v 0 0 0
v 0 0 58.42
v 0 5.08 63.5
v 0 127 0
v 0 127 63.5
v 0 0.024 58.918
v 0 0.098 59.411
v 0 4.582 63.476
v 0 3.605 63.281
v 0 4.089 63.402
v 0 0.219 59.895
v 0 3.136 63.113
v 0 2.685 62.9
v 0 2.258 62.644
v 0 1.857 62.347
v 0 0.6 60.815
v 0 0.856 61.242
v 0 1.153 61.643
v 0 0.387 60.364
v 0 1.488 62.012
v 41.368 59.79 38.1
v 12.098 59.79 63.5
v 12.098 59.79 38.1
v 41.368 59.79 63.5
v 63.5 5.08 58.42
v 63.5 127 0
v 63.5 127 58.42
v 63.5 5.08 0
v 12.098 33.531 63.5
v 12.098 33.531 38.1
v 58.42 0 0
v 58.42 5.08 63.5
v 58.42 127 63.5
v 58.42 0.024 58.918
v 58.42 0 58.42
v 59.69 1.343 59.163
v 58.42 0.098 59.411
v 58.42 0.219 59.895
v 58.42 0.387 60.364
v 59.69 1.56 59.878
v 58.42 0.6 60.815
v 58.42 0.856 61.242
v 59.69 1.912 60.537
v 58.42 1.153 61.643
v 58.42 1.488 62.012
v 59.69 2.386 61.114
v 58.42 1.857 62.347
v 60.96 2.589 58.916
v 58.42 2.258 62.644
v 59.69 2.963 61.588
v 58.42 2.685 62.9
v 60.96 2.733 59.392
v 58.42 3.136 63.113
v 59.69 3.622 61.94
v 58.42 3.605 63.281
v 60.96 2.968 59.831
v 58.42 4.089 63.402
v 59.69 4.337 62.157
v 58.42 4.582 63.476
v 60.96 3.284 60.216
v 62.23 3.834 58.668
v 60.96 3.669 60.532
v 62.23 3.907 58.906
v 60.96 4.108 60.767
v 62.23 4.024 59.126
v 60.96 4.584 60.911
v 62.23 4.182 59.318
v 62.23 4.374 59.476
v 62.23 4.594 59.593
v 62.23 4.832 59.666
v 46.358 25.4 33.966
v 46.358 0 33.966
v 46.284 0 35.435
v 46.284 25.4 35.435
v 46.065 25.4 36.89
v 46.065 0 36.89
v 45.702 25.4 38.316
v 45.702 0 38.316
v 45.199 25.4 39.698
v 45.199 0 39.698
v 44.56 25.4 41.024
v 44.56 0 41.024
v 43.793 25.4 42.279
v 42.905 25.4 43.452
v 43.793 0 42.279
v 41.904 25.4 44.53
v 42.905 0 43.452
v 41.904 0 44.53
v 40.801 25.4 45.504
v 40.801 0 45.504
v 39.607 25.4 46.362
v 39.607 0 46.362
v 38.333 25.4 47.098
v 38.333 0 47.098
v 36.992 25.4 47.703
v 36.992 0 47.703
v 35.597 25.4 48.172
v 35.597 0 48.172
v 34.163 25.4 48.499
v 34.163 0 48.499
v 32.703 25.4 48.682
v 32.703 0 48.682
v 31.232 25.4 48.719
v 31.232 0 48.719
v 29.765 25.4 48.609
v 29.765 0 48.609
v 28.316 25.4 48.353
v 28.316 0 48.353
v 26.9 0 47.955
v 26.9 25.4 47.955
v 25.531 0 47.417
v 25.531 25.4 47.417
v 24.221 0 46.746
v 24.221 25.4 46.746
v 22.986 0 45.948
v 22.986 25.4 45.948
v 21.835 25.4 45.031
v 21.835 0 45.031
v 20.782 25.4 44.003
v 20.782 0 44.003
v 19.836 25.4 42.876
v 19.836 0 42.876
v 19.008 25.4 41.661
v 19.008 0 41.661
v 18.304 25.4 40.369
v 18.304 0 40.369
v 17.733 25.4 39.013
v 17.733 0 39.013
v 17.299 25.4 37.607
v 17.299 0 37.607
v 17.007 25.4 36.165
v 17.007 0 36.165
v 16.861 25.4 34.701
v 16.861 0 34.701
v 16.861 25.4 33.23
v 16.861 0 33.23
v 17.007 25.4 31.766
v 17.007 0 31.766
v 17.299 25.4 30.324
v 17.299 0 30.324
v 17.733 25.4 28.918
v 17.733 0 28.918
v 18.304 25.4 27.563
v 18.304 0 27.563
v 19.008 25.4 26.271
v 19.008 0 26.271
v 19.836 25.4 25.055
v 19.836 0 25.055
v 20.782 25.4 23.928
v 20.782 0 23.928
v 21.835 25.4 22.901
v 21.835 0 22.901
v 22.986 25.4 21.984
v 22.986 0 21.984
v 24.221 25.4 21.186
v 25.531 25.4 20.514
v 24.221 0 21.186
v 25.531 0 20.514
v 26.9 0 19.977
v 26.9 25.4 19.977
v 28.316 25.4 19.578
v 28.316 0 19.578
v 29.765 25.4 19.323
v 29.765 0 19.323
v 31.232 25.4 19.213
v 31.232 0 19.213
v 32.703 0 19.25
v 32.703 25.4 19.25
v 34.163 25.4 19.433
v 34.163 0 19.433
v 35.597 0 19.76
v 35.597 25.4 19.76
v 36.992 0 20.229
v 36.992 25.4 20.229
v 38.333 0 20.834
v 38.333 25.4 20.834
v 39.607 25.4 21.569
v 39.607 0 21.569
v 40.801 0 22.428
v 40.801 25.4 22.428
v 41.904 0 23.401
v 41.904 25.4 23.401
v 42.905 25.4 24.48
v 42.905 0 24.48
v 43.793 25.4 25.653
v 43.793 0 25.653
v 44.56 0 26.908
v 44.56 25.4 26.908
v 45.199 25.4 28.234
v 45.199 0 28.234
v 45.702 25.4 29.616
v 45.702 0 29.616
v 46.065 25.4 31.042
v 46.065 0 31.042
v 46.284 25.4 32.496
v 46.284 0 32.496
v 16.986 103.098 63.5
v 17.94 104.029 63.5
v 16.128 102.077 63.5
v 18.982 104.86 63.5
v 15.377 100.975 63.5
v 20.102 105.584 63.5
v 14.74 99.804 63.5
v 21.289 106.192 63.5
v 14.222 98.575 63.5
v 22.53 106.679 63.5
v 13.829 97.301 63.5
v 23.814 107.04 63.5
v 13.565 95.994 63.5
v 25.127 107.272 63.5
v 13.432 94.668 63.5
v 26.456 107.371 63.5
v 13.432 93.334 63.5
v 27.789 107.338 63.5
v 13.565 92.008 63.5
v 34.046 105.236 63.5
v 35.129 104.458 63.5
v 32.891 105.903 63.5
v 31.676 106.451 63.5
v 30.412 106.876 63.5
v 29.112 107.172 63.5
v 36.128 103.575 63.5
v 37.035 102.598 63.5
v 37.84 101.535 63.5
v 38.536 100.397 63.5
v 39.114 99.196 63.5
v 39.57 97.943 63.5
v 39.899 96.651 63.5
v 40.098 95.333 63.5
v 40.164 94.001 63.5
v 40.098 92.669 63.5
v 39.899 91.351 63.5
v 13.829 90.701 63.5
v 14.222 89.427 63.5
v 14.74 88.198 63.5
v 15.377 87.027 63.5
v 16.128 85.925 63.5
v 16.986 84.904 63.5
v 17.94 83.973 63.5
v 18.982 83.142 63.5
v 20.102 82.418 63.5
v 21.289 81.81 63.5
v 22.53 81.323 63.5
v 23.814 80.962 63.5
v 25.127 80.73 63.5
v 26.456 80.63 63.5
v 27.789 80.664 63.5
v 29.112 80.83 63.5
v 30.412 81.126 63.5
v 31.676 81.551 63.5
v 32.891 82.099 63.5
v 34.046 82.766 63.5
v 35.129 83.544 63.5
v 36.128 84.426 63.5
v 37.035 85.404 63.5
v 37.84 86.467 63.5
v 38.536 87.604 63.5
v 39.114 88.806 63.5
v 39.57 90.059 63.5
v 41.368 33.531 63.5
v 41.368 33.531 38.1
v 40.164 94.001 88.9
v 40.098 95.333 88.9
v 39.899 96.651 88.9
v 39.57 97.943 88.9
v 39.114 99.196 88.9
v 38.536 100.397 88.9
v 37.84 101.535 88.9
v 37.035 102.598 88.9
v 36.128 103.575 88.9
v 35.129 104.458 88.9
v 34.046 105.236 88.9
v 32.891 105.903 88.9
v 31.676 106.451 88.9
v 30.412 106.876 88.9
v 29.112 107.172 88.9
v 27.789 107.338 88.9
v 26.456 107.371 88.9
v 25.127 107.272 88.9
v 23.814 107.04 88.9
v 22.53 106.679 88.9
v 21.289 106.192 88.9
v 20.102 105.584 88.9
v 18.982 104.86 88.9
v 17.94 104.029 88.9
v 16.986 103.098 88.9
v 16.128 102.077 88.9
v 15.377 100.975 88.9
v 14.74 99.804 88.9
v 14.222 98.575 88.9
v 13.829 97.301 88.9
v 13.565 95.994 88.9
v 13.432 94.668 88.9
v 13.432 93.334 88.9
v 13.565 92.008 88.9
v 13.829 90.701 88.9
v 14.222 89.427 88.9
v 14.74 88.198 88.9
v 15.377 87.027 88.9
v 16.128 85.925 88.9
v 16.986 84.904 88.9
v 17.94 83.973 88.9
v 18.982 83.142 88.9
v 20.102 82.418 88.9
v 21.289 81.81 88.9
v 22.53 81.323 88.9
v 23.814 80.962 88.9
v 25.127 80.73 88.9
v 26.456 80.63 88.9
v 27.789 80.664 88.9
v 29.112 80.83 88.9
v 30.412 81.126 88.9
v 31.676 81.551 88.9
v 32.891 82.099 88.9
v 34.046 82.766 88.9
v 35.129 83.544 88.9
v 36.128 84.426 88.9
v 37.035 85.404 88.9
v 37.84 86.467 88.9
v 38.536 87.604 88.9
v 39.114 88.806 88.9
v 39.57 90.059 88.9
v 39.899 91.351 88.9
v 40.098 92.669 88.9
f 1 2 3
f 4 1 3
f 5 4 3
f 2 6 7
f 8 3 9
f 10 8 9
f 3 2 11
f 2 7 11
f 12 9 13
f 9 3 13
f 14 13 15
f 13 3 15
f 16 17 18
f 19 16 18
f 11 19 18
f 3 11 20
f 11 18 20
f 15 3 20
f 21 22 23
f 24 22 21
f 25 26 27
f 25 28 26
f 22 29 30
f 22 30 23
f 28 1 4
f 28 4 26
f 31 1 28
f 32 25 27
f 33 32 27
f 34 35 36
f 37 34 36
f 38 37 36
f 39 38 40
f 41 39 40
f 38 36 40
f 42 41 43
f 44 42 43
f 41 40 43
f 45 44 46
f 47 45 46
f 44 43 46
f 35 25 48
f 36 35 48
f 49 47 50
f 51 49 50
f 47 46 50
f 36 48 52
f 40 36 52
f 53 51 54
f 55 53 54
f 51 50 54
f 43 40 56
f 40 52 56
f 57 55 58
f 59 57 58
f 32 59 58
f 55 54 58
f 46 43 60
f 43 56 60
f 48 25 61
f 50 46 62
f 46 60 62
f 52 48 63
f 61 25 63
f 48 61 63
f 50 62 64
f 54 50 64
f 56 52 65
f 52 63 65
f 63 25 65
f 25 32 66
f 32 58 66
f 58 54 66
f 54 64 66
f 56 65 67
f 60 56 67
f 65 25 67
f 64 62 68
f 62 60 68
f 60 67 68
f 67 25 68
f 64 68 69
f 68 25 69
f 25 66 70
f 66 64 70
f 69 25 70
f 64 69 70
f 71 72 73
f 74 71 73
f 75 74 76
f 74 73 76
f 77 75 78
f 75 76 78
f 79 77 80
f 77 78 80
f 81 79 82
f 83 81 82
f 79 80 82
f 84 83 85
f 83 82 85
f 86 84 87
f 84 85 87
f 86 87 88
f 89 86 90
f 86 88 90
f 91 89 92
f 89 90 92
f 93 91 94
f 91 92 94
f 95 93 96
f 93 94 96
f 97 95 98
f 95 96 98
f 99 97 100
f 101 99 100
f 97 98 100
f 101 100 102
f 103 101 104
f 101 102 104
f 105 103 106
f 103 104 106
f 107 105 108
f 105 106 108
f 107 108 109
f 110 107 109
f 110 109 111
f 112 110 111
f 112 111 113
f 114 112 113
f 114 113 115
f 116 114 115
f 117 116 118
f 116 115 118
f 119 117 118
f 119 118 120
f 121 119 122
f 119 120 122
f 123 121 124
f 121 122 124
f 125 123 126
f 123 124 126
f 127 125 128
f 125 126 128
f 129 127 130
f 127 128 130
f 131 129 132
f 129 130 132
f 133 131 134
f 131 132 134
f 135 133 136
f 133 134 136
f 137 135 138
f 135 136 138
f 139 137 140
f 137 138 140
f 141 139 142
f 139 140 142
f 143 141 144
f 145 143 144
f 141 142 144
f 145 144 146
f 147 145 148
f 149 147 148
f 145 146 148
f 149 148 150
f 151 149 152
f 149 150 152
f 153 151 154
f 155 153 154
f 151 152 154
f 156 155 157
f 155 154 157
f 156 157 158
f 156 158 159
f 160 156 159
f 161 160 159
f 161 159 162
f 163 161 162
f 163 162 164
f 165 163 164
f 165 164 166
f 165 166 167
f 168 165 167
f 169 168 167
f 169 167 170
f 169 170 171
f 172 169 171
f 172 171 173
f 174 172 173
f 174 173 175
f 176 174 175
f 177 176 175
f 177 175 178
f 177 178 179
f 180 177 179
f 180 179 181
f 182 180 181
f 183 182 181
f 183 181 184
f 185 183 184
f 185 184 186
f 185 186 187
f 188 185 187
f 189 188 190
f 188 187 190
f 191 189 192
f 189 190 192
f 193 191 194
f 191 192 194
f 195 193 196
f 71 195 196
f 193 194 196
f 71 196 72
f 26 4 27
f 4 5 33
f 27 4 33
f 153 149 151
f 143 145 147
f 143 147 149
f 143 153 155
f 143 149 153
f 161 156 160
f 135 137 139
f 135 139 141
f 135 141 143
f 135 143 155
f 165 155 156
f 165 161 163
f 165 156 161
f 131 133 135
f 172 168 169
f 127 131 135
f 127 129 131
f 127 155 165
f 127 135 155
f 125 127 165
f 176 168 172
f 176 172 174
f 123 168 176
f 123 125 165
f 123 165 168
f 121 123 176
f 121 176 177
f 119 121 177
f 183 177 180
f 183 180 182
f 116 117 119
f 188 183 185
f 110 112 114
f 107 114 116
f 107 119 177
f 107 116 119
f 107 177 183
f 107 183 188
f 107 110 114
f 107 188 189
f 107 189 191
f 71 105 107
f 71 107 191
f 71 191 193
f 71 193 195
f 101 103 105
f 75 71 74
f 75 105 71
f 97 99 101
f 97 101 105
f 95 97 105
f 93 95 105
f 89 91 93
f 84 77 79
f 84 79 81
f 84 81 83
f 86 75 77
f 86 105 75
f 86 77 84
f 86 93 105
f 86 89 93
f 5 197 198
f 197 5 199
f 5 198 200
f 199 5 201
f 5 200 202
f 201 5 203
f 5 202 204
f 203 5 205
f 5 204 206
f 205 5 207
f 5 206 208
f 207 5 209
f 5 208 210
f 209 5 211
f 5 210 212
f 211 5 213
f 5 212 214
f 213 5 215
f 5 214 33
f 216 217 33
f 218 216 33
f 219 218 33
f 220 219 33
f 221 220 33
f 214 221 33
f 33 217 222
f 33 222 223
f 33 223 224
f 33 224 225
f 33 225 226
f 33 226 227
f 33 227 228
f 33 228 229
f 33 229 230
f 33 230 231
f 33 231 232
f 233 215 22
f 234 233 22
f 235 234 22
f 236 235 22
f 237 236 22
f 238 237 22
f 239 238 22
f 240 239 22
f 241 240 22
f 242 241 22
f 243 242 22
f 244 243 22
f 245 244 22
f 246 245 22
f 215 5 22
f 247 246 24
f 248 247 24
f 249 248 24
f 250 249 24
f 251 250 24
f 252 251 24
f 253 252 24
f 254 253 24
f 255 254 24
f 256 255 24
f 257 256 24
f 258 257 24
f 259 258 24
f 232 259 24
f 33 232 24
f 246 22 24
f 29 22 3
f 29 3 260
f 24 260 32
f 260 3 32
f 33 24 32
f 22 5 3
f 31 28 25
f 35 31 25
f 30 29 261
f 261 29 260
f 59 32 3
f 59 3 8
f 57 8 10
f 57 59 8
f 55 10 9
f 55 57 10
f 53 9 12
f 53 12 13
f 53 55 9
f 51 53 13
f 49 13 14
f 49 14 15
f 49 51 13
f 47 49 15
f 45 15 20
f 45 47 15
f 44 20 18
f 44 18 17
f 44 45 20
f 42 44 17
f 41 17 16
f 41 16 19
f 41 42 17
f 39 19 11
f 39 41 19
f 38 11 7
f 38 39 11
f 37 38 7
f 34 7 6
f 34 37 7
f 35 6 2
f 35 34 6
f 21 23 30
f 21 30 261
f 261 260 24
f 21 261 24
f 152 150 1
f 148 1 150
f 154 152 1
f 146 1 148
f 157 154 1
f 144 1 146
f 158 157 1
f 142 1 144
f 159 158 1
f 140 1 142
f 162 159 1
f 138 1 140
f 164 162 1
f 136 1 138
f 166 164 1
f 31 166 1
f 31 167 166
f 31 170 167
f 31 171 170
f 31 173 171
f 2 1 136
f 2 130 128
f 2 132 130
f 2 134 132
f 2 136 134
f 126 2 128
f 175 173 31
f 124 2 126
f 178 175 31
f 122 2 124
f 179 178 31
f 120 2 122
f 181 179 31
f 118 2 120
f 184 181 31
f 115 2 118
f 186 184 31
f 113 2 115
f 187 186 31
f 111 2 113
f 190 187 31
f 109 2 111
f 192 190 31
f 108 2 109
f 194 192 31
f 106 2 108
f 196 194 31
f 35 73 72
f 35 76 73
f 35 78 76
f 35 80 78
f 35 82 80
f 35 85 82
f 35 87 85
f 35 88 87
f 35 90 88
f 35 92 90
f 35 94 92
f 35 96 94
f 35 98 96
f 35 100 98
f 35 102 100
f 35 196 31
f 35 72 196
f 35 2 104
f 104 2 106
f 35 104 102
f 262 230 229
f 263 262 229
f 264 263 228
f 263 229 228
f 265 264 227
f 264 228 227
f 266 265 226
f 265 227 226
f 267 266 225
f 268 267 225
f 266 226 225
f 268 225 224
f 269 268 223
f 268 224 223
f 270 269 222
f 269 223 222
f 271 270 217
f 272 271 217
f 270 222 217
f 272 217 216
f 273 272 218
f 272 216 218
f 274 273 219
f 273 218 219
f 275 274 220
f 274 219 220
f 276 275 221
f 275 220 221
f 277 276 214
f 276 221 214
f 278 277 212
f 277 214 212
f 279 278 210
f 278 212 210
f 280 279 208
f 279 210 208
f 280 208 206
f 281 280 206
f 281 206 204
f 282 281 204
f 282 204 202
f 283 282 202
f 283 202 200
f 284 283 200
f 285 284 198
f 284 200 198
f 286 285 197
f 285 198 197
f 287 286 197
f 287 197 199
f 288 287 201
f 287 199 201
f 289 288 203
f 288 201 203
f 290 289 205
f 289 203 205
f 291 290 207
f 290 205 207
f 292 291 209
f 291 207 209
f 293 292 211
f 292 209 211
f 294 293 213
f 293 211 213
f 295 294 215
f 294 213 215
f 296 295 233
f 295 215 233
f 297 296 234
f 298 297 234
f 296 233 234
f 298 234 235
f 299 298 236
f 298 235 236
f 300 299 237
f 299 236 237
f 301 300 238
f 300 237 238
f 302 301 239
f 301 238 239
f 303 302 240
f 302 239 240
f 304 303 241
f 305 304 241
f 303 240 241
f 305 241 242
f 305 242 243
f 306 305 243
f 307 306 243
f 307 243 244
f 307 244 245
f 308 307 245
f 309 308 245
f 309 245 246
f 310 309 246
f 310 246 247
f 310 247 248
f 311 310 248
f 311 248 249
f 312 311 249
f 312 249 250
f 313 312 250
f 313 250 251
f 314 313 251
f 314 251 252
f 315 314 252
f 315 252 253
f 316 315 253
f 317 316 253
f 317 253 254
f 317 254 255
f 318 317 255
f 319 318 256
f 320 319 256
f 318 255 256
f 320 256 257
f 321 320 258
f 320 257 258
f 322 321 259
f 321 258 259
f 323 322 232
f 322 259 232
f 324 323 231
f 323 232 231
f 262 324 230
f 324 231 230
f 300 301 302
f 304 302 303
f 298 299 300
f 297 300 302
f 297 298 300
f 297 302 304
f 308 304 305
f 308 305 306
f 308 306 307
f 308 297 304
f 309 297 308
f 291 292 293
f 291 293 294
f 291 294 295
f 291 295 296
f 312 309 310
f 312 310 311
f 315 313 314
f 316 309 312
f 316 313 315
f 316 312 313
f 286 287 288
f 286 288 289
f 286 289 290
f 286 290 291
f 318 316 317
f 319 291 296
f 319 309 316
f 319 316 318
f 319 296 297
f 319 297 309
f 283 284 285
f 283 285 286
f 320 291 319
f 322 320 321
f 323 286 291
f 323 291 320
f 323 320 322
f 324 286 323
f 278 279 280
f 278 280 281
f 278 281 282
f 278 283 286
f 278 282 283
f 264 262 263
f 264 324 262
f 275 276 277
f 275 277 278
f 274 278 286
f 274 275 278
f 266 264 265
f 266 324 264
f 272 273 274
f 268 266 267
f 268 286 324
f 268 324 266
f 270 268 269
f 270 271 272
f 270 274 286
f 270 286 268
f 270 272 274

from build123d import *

# Parameters (mm, degrees)
F0_W     = 63.5
F0_H     = 63.5
F1_DEPTH = 127
F2_R     = 5.08
F3_SIZE  = 5.08
F4_W     = 29.269816
F4_H     = 26.25883
F5_DEPTH = 25.4
F4_R     = 13.374611
F6_DEPTH = 25.4
F7_R     = 14.75744
F8_DEPTH = 25.4


with BuildPart() as f1:
    # F0 (on Front) → F1 (new body)
    with BuildSketch(Plane.XZ):
        with Locations((31.75, 31.75)):
            Rectangle(F0_W, F0_H)
    extrude(amount=-F1_DEPTH)

    # F2
    f2_edges = [f1.edges().sort_by_distance(p)[0] for p in [
        (31.75, 0, 63.5),
    ]]
    fillet(f2_edges, radius=F2_R)

    # F3
    f3_edges = [f1.edges().sort_by_distance(p)[0] for p in [
        (63.5, 66.04, 63.5),
        (63.5, 0, 29.21),
    ]]
    chamfer(f3_edges, length=F3_SIZE)

    # F4 (on face) → F5 (cut)
    with BuildSketch(Plane.XY.offset(63.5)):
        with Locations((26.733129, 46.660667)):
            Rectangle(F4_W, F4_H)
    extrude(amount=-F5_DEPTH, mode=Mode.SUBTRACT)

    # F4 (on face) → F6 (join)
    with BuildSketch(Plane.XY.offset(63.5)):
        with Locations((26.789799, 94.000928)):
            Circle(F4_R)
    extrude(amount=F6_DEPTH)

    # F7 (on face) → F8 (cut)
    with BuildSketch(Plane.XZ):
        with Locations((31.600073, 33.965837)):
            Circle(F7_R)
    extrude(amount=-F8_DEPTH, mode=Mode.SUBTRACT)


solid = f1.part
